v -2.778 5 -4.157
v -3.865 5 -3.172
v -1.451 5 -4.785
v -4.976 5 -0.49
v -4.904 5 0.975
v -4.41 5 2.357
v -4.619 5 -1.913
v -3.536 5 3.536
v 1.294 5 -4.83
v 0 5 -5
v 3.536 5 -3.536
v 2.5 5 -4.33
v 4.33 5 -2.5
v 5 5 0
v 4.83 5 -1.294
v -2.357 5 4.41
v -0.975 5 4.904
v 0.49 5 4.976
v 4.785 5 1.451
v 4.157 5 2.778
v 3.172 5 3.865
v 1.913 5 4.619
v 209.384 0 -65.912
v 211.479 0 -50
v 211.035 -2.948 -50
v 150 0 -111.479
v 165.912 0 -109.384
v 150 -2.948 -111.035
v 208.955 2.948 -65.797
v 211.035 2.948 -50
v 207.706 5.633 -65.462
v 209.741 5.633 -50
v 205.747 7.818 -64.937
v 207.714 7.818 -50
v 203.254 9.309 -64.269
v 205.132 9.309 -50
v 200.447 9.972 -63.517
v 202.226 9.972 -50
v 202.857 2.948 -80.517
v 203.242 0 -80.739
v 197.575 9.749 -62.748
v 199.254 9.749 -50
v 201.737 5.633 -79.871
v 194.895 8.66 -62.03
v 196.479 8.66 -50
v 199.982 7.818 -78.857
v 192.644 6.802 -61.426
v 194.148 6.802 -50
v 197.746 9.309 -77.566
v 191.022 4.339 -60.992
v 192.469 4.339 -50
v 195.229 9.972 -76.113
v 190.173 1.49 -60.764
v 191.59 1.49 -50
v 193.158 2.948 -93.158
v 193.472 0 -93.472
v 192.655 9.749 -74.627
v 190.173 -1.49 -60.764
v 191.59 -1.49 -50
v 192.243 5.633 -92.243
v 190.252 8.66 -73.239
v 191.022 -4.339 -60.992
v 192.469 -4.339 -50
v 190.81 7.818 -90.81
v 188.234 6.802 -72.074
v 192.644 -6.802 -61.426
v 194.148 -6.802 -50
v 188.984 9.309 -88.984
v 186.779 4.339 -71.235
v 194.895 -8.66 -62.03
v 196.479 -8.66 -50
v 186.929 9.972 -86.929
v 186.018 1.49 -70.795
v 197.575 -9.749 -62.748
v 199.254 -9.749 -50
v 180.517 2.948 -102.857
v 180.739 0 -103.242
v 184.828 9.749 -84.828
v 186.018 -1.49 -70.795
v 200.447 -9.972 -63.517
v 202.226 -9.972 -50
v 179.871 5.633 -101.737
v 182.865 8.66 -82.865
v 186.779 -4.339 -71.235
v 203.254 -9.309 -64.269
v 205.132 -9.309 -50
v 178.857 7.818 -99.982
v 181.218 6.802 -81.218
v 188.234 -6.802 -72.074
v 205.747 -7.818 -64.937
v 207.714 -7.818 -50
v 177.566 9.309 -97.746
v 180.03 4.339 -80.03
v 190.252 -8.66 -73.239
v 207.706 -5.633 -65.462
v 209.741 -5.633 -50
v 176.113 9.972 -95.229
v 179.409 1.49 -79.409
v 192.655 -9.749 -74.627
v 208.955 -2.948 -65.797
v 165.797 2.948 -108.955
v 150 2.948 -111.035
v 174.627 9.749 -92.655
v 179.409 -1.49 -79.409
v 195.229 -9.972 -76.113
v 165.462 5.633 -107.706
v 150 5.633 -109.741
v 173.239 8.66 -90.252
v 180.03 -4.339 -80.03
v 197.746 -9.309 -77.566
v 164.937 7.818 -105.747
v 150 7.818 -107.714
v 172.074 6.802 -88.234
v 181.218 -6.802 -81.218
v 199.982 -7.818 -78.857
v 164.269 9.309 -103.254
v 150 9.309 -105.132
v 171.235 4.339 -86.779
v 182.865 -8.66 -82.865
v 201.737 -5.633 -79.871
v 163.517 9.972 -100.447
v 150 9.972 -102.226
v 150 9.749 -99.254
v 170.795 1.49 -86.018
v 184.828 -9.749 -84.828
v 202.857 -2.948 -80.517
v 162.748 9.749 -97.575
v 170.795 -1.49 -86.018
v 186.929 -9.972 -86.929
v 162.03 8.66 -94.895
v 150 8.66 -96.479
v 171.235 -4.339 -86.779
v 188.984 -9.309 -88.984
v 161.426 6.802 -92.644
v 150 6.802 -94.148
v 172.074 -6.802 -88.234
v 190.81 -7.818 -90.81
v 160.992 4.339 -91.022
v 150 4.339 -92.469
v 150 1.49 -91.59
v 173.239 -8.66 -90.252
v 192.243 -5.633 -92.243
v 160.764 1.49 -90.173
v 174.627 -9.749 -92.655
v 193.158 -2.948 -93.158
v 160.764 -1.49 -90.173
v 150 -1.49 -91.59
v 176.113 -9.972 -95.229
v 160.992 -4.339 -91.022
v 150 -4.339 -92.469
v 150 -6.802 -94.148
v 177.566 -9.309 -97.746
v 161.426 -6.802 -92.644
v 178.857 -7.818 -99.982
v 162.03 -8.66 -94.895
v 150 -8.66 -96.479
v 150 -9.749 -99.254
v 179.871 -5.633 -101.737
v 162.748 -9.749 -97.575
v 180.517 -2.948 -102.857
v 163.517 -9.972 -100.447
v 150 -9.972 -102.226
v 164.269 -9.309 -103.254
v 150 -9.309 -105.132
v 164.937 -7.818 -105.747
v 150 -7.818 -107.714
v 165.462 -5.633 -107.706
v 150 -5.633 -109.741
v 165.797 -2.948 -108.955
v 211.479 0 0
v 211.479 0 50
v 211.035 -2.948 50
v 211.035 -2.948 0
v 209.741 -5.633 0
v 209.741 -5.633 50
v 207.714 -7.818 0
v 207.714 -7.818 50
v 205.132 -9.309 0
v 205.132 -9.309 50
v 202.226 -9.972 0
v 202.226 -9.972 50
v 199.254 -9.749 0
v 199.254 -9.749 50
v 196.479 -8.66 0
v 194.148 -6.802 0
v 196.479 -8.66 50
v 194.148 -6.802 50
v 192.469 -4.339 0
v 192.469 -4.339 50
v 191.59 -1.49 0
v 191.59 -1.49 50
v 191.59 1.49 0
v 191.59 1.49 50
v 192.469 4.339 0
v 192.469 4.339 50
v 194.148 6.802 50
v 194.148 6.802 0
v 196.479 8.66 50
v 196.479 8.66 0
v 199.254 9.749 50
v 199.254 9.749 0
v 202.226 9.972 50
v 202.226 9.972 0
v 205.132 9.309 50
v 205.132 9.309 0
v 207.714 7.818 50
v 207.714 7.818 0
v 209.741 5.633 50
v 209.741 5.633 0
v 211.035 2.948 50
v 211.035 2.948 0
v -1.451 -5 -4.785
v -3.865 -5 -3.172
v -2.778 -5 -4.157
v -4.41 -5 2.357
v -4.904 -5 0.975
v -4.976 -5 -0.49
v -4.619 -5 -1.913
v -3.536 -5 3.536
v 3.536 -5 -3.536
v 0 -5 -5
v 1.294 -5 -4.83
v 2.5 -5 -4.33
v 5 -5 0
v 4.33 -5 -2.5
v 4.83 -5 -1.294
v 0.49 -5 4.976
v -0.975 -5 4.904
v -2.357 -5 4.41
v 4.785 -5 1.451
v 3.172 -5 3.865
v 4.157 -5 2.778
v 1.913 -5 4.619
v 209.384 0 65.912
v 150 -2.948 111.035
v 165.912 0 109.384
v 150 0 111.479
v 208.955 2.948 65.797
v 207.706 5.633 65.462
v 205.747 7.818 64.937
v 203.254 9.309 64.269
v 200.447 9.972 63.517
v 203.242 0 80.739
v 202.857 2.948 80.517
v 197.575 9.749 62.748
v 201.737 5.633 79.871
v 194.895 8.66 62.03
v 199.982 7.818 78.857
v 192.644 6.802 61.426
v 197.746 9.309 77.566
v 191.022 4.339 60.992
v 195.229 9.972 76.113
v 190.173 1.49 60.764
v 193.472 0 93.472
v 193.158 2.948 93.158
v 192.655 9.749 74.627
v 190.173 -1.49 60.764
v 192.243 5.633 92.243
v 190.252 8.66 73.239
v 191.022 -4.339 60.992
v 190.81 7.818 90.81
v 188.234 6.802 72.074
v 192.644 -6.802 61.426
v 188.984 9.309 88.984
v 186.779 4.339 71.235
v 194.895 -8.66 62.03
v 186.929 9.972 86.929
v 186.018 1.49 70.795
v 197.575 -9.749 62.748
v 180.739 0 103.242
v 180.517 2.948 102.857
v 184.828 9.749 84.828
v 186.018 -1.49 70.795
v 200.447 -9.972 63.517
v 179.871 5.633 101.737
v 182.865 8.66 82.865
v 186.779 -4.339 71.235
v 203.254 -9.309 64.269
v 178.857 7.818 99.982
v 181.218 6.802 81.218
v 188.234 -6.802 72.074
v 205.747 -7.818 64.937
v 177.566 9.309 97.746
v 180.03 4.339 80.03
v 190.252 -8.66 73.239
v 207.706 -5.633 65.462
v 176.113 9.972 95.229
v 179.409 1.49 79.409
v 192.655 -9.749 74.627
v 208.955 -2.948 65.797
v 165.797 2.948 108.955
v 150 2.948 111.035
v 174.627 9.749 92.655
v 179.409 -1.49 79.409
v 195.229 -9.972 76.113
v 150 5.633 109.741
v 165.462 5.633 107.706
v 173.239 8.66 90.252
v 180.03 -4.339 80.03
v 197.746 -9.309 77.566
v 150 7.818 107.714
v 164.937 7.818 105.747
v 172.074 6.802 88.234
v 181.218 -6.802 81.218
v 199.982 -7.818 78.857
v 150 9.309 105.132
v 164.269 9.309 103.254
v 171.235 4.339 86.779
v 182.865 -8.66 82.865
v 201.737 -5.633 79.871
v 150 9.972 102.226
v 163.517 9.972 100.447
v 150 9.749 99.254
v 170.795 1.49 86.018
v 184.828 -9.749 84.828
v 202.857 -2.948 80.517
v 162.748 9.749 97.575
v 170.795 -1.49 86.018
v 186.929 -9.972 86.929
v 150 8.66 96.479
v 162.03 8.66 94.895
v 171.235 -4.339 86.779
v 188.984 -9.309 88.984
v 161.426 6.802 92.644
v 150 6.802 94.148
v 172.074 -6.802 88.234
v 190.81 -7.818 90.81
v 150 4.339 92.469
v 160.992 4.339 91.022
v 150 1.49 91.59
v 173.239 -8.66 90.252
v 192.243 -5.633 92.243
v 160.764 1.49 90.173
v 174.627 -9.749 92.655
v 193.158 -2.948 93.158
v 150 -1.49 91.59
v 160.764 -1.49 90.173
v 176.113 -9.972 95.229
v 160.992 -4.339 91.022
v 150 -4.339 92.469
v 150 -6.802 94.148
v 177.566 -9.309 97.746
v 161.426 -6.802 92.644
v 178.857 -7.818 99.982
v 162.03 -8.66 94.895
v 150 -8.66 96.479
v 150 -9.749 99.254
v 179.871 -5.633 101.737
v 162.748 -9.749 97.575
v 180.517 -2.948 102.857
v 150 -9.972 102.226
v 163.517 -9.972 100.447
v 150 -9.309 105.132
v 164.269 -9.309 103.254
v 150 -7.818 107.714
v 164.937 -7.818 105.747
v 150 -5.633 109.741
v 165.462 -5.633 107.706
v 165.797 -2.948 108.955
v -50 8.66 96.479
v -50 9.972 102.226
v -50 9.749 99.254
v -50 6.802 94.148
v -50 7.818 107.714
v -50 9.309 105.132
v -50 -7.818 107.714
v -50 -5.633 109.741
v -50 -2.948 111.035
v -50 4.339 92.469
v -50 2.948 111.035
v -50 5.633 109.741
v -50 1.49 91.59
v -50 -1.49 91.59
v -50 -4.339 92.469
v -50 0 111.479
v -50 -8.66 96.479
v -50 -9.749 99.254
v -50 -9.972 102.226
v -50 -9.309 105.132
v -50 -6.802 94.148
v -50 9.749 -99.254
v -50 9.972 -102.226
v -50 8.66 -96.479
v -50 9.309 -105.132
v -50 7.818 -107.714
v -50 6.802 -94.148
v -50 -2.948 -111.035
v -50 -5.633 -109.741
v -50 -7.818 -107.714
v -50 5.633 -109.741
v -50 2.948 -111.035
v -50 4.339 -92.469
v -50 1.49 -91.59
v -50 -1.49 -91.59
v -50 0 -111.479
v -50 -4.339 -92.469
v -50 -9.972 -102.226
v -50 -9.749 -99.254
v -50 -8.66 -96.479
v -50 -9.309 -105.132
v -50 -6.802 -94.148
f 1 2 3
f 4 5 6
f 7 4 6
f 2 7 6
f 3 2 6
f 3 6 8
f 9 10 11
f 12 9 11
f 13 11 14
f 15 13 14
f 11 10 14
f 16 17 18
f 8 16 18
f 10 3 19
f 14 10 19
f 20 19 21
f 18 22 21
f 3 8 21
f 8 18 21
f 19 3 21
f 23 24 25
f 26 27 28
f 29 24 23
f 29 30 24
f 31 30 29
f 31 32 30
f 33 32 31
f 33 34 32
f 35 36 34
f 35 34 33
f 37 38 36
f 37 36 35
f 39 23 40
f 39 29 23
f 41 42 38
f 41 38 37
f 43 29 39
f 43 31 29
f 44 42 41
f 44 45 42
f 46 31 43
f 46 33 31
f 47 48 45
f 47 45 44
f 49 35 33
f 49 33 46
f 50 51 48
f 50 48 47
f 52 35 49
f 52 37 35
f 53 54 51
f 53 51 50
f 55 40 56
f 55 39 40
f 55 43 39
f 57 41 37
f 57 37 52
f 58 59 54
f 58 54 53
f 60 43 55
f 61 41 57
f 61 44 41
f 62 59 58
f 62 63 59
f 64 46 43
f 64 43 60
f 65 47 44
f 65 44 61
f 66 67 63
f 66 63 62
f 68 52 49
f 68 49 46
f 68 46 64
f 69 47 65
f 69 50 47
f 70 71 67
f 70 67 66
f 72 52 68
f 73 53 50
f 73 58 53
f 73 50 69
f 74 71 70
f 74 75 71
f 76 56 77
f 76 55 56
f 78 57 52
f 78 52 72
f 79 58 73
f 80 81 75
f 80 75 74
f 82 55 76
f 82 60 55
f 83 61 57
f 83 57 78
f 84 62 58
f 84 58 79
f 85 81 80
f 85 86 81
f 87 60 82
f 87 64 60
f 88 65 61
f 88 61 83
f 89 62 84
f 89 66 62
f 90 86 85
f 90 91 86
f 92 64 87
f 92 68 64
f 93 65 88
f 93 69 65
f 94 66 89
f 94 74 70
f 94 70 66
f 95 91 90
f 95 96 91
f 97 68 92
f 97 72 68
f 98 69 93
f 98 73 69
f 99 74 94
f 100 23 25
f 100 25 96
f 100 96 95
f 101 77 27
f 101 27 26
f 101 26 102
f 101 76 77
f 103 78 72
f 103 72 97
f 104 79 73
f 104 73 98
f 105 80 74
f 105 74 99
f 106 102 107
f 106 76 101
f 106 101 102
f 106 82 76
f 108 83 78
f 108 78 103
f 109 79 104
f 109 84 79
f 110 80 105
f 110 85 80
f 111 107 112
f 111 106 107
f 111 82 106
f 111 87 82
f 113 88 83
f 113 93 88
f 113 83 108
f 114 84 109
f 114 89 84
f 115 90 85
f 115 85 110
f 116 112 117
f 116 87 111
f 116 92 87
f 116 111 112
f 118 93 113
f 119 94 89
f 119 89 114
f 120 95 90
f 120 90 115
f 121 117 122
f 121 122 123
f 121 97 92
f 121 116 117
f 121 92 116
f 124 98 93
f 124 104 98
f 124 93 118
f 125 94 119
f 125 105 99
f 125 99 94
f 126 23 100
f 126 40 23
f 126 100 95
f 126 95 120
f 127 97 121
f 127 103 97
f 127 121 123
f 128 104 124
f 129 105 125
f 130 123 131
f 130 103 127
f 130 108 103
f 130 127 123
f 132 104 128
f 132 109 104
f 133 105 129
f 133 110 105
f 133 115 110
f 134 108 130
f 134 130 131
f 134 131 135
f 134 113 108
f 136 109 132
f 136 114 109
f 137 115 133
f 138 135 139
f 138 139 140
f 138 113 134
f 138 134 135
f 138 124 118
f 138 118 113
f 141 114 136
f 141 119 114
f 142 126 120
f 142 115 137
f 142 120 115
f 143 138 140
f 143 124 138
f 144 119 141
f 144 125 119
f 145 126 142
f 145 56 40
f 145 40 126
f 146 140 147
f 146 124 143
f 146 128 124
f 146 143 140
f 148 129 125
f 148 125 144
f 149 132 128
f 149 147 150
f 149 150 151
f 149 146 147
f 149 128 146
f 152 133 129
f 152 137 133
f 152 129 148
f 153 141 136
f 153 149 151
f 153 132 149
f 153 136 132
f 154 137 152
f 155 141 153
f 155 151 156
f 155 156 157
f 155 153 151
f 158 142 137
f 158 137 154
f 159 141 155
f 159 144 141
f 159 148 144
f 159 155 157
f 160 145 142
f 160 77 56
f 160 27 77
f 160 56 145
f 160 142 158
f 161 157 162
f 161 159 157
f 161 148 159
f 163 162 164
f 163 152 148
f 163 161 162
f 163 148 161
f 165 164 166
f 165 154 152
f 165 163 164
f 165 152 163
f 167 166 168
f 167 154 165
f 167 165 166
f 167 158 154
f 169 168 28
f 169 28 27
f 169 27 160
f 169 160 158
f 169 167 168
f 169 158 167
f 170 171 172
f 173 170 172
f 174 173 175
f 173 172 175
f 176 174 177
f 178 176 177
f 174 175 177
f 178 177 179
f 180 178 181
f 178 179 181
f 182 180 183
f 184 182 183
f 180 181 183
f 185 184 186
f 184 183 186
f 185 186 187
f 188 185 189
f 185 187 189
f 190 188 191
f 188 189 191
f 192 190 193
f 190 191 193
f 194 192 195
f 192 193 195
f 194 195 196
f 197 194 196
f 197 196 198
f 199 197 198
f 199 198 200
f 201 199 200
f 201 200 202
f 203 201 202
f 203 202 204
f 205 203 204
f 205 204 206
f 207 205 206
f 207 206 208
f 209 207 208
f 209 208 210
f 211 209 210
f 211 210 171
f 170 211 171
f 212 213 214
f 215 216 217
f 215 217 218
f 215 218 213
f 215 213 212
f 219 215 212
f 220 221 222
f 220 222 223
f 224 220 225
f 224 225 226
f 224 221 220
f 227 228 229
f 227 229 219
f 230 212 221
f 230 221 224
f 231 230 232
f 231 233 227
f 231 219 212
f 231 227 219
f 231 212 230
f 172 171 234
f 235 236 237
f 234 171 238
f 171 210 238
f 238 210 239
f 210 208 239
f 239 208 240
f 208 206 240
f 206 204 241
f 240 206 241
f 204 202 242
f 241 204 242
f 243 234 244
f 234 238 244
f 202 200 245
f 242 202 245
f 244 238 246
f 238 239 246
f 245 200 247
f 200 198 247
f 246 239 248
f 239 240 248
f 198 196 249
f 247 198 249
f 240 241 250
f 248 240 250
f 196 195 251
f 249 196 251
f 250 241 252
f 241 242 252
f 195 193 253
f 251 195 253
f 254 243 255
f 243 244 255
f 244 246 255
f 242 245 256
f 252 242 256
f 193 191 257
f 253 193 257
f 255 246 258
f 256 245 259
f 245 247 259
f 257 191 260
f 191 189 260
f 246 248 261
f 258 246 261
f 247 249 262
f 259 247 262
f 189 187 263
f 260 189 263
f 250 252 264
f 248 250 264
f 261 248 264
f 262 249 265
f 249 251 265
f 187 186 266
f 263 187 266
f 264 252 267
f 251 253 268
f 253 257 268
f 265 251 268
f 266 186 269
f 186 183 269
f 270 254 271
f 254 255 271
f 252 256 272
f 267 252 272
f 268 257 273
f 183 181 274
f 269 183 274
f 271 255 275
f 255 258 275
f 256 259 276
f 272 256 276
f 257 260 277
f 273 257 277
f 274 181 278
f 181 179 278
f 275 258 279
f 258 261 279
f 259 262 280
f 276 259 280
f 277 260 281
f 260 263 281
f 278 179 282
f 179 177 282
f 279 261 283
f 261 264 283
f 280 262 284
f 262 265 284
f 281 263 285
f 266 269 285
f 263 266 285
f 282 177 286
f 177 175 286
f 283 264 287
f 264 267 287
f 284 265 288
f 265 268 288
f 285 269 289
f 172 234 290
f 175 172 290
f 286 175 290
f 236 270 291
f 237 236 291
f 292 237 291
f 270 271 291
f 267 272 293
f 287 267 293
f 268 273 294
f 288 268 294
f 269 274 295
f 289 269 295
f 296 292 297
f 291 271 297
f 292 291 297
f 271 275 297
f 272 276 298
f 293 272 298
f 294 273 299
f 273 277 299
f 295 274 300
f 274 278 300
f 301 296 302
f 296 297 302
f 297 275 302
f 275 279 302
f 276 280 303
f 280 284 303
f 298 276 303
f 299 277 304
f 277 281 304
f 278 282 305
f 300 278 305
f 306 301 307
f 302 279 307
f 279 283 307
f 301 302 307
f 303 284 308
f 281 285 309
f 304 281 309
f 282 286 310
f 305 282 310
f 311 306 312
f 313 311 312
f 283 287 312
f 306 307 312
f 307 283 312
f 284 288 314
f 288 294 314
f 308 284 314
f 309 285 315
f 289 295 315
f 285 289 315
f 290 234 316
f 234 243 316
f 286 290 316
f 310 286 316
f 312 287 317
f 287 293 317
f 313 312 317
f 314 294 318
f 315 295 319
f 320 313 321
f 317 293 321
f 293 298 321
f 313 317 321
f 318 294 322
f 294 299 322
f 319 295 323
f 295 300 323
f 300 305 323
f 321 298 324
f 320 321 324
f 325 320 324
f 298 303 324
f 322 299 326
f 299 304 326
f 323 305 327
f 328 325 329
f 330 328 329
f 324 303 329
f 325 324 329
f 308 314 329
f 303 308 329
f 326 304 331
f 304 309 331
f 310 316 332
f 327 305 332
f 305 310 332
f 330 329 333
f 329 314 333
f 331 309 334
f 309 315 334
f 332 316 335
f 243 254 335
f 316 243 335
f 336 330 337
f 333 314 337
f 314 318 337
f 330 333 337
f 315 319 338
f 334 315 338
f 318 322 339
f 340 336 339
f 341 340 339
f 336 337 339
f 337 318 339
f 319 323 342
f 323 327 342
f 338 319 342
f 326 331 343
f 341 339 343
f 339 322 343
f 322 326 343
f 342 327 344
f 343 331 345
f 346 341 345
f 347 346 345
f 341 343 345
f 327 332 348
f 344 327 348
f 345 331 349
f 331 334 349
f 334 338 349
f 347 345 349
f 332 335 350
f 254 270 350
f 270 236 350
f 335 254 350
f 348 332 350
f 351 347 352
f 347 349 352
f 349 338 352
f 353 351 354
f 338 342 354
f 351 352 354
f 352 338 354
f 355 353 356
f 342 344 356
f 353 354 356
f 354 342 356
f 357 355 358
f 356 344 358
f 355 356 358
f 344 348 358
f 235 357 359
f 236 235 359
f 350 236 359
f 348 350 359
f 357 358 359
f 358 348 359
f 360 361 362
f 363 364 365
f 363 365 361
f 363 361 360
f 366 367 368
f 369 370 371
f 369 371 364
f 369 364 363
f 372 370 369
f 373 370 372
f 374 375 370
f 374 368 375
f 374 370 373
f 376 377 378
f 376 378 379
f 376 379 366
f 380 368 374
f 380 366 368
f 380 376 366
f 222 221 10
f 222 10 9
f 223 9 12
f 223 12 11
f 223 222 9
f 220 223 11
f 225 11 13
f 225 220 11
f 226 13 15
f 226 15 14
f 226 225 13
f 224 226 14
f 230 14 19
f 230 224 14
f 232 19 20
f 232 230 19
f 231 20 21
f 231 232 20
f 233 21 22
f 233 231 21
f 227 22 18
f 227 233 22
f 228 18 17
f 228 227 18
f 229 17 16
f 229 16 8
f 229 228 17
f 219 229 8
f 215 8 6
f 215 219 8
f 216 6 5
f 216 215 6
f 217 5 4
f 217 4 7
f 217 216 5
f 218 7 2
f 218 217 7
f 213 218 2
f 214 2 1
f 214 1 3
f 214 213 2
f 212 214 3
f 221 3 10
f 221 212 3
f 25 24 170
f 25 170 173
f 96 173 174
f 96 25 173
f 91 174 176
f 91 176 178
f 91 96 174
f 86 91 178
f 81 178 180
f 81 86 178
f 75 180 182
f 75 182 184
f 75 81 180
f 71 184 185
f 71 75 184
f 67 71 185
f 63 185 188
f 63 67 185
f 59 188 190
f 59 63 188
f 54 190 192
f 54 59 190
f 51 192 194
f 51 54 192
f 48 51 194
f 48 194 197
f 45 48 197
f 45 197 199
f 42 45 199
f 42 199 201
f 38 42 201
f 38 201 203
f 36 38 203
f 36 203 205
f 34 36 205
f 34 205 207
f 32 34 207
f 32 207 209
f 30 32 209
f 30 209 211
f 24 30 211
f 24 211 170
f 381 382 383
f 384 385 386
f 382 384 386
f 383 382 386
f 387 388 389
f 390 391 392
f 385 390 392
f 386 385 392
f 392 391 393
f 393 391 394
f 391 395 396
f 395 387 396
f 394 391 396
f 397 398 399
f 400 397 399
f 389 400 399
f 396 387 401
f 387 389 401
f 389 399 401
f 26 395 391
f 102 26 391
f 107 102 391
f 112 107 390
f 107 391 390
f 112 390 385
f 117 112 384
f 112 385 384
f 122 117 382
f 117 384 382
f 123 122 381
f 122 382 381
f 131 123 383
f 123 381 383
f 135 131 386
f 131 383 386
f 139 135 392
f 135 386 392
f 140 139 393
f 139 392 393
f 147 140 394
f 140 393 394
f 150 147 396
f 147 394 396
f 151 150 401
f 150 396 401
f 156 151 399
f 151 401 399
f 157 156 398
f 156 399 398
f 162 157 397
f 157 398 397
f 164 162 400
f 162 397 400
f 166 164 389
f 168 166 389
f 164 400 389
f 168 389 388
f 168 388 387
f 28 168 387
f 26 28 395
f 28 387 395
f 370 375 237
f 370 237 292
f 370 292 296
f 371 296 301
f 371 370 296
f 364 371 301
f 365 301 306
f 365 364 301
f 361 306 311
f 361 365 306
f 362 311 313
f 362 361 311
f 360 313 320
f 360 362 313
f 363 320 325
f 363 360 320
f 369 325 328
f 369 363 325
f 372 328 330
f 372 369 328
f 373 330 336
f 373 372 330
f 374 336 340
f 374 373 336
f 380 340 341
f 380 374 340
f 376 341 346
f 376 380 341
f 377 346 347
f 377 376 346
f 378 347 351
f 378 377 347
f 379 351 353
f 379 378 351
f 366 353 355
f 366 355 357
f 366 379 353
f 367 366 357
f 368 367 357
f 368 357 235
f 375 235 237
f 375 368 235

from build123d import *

# Parameters (mm, degrees)
F1_DEPTH = 5
F2_R     = 10


with BuildPart() as f1:
    # F0 (on Front) → F1 (new body, symmetric)
    with BuildSketch(Plane.XZ):
        with BuildLine():
            Line((0, -5), (0, 0))
            Line((0, 0), (5, 0))
            ThreePointArc((5, 0), (-3.535534, 3.535534), (0, -5))
        make_face()
        with BuildLine():
            Line((5, 0), (0, 0))
            Line((0, 0), (0, -5))
            ThreePointArc((0, -5), (3.535534, -3.535534), (5, 0))
        make_face()
    extrude(amount=F1_DEPTH, both=True)


with BuildPart() as f3:
    # F3: sweep along a path in F0
    with BuildLine(Plane.XZ) as f3_path:
        Line((200, 0), (200, -50))
        ThreePointArc((200, -50), (185.355339, -85.355339), (150, -100))
        Line((150, -100), (0, -100))
        Line((0, -100), (-50, -100))
    # F2 (on Top) → F3 (sweep)
    with BuildSketch(Plane.XY):
        with Locations((201.478779, 0)):
            Circle(F2_R)
    sweep(path=f3_path.line)

    # F4: F3 across face


with BuildPart() as f3_1:
    add(f3.part)
    add(f3.part.mirror(Plane(origin=(201.478779, 0, 0), x_dir=(1, 0, 0), z_dir=(0, 0, 1))))


solid = Compound([f1.part, f3_1.part])
